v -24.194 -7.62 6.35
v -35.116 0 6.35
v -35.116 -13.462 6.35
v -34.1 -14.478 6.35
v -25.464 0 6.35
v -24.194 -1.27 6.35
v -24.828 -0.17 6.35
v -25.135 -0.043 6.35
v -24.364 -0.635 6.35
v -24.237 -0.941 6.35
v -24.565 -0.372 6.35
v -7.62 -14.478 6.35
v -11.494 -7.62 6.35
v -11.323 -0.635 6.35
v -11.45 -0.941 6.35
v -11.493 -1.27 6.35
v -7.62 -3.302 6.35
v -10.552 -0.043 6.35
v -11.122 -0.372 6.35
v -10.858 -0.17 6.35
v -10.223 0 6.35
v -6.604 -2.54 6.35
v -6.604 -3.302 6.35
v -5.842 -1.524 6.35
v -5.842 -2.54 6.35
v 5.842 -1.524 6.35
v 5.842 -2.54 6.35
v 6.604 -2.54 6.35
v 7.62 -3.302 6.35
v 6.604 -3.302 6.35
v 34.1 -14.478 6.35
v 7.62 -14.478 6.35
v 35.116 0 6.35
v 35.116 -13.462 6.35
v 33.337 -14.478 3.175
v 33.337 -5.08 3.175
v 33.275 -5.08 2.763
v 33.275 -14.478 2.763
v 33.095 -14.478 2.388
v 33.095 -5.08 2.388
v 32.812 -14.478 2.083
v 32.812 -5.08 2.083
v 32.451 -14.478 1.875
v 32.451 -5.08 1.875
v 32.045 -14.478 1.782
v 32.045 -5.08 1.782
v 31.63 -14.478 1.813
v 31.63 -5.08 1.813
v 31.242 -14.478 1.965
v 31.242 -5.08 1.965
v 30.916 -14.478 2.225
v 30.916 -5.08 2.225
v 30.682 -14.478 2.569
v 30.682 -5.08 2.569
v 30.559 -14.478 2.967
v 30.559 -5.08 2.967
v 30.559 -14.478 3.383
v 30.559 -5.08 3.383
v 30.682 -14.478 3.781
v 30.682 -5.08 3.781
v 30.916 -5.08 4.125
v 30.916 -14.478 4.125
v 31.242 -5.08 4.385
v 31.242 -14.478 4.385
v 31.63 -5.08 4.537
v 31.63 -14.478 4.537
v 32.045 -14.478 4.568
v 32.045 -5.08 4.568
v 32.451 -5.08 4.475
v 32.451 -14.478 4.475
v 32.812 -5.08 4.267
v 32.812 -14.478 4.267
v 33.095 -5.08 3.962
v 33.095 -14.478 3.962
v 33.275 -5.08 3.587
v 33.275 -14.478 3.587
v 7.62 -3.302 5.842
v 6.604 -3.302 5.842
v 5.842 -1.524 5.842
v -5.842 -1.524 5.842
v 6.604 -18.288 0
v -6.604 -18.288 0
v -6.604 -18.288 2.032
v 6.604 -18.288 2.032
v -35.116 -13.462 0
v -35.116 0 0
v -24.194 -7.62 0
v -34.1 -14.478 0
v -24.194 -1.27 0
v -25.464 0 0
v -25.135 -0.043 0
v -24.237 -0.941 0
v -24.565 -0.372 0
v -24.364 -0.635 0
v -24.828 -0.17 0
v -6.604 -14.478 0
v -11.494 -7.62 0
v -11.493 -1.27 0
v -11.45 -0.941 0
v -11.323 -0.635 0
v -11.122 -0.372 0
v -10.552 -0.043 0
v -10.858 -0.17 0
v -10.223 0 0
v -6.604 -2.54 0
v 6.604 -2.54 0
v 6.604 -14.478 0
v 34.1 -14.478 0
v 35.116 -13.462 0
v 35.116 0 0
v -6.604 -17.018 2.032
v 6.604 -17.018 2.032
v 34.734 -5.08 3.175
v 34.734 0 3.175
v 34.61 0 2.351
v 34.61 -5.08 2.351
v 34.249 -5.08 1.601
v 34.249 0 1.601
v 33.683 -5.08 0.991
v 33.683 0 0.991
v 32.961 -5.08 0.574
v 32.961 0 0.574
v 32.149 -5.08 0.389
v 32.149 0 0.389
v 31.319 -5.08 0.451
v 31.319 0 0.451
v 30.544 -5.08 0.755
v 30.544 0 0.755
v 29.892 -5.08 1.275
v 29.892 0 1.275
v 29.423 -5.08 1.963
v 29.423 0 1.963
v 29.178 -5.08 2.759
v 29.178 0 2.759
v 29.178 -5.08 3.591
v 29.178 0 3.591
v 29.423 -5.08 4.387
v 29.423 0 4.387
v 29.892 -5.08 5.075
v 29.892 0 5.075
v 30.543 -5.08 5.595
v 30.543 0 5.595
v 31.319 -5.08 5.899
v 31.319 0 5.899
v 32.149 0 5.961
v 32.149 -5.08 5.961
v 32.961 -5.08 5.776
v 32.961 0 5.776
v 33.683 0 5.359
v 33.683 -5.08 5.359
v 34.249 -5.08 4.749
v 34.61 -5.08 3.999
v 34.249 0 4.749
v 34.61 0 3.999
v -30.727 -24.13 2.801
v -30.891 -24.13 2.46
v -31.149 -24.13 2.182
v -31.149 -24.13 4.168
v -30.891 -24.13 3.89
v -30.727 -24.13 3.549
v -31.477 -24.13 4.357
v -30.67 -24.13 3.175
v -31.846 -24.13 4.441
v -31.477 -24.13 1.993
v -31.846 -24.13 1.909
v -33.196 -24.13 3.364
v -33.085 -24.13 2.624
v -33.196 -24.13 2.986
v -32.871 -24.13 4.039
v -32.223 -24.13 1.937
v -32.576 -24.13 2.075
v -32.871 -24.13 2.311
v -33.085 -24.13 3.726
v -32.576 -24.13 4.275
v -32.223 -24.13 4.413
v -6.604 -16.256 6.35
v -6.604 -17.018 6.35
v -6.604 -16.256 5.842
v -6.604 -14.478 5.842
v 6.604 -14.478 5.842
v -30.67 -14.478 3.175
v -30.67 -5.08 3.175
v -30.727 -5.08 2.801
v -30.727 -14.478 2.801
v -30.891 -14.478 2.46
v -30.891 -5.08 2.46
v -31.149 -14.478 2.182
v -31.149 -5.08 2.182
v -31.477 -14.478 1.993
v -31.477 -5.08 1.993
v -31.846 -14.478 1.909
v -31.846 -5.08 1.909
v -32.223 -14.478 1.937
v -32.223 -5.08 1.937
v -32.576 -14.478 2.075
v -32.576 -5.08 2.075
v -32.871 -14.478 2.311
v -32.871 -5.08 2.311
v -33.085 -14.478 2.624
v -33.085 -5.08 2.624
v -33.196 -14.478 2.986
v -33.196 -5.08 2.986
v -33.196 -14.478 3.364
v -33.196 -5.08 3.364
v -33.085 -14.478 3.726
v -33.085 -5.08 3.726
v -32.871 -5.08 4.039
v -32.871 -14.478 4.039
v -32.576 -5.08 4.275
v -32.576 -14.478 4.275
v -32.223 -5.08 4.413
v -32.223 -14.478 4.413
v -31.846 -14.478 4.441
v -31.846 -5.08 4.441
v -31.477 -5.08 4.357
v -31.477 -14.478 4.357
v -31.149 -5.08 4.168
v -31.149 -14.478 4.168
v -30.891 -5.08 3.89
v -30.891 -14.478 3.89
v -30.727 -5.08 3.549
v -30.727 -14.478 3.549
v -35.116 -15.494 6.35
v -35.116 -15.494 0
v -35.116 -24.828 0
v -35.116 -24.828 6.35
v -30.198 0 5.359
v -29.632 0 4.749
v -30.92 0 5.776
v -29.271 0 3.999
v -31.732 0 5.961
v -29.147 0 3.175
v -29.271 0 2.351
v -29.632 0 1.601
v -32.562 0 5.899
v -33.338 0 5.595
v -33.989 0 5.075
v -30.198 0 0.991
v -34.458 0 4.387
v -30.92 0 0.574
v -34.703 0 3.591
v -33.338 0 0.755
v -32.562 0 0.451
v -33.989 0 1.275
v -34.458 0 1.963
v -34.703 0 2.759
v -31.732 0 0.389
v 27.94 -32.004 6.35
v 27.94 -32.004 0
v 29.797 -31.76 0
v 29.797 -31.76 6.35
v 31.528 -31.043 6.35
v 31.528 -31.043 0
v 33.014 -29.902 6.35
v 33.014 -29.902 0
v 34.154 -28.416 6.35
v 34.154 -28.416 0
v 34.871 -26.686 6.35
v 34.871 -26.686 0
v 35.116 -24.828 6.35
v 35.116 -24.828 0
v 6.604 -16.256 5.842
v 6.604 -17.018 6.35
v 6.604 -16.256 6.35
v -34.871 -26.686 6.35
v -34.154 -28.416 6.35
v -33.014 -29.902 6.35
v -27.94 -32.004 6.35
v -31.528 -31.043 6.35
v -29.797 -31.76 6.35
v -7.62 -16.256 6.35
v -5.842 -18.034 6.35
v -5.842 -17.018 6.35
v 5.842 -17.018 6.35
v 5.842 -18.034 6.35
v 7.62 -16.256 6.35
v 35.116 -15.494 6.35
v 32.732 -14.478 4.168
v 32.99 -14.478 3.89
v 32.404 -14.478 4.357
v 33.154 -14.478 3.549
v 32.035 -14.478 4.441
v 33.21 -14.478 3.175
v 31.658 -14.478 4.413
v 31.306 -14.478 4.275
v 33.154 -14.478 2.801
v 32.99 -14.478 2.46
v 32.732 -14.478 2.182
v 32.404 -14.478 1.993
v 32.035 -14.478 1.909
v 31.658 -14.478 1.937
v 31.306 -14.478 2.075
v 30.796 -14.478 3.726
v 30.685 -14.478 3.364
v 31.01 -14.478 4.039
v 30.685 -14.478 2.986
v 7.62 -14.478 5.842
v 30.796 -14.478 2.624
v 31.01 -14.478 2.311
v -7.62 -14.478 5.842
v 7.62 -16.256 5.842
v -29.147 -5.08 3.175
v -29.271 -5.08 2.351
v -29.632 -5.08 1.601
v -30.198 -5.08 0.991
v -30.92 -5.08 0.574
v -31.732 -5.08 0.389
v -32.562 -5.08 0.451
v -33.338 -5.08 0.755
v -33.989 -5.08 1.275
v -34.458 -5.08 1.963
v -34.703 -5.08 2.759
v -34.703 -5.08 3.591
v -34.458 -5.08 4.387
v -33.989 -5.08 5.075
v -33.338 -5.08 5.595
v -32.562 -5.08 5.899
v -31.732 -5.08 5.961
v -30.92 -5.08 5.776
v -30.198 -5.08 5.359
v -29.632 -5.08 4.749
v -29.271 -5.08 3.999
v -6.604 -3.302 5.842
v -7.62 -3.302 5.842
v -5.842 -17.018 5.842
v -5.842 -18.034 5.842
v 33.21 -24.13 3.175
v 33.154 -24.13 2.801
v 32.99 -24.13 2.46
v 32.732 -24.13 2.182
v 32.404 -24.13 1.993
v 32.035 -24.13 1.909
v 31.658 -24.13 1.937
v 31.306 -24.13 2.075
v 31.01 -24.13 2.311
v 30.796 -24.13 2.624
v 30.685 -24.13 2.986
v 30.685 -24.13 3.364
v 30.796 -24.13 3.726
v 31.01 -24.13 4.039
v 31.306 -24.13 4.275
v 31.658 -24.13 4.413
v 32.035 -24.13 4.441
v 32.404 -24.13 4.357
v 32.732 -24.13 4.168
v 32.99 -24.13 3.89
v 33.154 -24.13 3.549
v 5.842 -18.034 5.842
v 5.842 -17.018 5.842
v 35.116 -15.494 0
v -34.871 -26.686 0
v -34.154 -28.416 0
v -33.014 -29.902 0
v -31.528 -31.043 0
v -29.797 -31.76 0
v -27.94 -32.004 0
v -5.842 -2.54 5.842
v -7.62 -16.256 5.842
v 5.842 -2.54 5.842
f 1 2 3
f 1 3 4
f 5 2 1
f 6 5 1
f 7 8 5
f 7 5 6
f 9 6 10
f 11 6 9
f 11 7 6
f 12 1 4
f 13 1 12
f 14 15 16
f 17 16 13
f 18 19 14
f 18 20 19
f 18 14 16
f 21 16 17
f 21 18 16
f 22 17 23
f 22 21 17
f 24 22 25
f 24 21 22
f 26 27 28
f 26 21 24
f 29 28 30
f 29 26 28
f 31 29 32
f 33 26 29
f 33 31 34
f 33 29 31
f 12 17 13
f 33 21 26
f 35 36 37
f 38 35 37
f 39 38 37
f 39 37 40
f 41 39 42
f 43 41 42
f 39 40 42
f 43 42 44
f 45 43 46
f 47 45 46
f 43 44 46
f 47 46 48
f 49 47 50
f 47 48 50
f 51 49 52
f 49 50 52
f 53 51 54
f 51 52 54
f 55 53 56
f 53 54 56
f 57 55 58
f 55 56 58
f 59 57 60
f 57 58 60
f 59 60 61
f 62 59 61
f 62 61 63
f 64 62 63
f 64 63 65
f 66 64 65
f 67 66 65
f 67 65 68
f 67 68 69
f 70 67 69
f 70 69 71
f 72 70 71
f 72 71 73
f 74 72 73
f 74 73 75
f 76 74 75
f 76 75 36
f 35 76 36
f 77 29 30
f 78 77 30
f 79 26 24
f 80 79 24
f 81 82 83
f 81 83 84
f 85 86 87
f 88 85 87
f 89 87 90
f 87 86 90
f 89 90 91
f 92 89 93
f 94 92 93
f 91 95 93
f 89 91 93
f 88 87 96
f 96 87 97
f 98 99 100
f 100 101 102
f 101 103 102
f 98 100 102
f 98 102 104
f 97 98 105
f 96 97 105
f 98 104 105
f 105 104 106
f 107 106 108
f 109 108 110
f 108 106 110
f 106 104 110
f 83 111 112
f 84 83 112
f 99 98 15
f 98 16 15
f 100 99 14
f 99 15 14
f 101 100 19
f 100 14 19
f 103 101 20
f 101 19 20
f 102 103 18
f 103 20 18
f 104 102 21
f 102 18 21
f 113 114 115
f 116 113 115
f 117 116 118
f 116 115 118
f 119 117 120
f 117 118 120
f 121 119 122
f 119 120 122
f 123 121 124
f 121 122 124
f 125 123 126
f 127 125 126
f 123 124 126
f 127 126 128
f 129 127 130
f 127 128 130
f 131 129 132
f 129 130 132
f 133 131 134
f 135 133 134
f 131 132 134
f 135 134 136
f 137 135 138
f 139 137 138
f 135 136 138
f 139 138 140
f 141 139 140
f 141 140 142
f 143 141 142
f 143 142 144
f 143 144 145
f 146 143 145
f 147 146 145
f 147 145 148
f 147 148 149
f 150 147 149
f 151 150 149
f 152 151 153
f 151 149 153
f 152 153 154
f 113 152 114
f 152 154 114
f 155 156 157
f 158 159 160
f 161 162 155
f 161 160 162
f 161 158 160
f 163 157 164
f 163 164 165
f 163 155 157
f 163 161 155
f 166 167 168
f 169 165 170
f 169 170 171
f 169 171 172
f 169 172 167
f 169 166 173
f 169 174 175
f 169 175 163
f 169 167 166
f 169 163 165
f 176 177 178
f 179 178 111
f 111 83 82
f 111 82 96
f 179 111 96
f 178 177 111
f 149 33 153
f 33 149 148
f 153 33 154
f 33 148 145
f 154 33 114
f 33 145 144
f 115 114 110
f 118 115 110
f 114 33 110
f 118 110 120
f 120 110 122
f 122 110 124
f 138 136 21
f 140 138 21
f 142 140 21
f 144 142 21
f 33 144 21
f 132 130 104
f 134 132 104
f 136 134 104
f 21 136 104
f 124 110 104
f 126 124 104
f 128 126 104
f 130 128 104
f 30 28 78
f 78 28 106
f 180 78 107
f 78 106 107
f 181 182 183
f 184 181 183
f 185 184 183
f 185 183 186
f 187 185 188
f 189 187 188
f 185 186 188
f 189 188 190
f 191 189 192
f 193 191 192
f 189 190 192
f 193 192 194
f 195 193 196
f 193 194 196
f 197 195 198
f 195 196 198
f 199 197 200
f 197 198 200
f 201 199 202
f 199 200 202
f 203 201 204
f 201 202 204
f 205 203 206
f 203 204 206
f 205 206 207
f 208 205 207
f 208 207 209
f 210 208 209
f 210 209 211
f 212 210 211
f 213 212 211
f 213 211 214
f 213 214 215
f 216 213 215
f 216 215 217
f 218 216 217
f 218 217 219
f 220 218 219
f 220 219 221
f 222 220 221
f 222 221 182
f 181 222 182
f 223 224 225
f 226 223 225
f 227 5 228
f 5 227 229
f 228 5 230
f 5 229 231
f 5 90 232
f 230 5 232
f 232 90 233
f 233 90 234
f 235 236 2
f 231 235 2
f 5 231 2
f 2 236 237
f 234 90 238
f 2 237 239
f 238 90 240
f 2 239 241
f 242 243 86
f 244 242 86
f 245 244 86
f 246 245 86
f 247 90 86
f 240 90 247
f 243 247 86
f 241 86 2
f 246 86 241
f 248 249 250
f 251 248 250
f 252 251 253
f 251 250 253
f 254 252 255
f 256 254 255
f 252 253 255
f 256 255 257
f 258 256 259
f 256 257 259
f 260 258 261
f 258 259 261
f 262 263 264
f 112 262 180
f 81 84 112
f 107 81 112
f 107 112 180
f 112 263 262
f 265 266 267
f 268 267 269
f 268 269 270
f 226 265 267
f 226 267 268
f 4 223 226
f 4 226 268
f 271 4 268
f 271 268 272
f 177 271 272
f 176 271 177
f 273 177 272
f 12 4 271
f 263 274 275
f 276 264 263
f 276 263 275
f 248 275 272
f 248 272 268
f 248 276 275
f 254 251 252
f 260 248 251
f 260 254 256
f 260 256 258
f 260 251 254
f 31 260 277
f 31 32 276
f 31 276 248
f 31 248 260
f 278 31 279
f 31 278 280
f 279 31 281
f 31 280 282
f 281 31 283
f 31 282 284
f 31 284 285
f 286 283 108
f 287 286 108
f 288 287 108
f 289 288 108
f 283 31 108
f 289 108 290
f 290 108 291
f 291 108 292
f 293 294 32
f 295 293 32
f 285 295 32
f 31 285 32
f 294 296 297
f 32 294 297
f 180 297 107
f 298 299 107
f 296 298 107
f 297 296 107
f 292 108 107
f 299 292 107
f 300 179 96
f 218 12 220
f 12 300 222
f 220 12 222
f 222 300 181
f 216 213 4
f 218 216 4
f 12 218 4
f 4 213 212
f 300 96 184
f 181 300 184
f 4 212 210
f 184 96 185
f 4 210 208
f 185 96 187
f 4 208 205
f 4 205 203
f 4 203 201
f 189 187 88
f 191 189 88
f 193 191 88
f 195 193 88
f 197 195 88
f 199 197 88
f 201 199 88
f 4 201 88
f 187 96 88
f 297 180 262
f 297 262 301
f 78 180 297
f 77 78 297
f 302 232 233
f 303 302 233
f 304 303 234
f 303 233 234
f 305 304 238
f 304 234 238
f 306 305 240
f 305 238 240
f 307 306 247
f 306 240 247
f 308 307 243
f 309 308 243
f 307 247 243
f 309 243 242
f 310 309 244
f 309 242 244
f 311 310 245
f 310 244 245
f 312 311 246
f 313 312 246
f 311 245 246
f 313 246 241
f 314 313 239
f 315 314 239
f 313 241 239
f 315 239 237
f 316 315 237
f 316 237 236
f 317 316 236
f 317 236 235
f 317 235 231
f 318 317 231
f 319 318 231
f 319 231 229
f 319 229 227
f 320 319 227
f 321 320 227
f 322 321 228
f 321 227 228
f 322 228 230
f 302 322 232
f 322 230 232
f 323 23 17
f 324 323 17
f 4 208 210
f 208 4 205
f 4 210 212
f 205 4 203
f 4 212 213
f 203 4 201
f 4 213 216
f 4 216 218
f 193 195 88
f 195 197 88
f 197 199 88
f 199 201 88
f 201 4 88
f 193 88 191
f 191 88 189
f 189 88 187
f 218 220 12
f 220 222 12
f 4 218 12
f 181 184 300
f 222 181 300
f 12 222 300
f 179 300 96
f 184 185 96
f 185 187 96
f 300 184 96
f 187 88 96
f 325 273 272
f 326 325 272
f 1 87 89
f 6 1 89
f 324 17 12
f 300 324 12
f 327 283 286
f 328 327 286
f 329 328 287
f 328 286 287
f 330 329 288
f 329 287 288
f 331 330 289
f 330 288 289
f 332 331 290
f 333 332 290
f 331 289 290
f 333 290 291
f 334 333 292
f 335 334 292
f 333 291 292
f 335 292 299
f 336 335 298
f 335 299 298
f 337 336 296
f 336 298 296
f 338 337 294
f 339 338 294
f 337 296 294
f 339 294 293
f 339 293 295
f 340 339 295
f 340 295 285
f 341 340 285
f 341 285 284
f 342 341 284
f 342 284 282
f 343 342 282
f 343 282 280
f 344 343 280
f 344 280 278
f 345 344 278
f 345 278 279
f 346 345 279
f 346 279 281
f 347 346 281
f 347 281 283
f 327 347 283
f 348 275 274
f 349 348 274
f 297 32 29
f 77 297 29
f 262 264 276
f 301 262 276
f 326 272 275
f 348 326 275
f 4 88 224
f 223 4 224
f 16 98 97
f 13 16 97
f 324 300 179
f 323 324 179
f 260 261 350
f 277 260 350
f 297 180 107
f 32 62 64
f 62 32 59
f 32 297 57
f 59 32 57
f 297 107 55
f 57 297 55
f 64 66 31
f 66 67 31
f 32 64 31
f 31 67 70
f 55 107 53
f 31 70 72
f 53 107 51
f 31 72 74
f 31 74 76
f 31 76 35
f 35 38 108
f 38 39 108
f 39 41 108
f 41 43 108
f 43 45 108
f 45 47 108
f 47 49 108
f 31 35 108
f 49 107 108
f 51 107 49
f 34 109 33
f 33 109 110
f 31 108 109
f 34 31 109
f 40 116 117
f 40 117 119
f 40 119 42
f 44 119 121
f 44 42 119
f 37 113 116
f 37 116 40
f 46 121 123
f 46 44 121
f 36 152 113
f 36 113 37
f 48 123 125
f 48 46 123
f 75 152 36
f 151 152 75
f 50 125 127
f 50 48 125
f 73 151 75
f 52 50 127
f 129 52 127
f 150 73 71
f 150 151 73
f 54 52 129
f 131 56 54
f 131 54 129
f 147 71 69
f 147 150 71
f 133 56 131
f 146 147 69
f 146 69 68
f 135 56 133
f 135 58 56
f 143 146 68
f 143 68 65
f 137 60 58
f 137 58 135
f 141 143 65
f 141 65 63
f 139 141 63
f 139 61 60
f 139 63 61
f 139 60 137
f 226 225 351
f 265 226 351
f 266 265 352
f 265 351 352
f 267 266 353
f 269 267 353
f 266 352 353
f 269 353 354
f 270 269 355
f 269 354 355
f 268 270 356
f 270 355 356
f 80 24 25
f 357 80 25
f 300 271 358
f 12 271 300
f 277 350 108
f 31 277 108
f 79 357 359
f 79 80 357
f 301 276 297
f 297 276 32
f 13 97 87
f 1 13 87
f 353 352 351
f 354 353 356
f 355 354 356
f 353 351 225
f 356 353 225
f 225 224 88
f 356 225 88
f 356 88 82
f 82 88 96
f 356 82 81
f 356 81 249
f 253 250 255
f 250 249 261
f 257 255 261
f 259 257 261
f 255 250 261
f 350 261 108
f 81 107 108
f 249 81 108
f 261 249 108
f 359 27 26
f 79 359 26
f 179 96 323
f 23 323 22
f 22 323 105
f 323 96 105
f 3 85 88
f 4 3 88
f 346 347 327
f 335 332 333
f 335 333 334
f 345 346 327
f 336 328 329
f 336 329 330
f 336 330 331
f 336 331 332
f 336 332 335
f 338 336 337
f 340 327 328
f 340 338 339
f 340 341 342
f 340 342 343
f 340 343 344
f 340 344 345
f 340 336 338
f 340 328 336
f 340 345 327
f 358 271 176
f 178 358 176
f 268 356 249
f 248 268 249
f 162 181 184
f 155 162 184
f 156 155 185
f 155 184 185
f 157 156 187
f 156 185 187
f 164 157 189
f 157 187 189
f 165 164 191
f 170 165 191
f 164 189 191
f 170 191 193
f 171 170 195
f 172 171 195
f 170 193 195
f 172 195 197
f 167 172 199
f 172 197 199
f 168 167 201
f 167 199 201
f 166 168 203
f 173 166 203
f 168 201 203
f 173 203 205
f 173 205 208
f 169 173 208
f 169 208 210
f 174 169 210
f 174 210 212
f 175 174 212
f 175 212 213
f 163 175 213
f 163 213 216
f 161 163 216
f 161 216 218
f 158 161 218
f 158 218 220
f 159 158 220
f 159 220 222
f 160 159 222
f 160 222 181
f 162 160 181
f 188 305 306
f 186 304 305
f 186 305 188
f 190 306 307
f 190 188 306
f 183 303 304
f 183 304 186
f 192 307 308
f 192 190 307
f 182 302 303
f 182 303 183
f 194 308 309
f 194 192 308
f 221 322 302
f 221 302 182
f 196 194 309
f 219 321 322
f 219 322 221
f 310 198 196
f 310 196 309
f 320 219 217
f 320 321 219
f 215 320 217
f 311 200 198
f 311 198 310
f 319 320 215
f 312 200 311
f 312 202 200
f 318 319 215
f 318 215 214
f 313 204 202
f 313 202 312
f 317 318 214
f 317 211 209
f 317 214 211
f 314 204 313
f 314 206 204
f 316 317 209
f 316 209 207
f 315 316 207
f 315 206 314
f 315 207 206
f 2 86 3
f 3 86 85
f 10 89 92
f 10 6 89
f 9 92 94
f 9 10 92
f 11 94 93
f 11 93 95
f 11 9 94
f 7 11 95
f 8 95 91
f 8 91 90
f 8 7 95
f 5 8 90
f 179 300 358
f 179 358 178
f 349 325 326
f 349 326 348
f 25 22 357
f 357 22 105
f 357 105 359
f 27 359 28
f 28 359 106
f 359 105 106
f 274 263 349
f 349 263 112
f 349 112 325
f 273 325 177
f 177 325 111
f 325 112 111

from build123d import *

# Parameters (mm, degrees)
F0_W      = 6.604
F0_H      = 2.54
F1_DEPTH  = 6.35
F0_H_2    = 1.27
F0_W_2    = 2.54
F2_DEPTH  = 6.35
F3_DEPTH  = 2.032
F6_DEPTH  = 5.08
F7_DEPTH  = 24.13
F8_DEPTH  = 14.478
F11_W     = 1.016
F11_H     = 1.778
F12_DEPTH = 0.508
F13_DEPTH = 0.508
F14_R     = 1.27


# Not quite as in the source:
# - a feature names something its author has since deleted; it is built from what else it names


with BuildPart() as f1:
    # F0 (on Top) → F1 (new body)
    with BuildSketch(Plane.XY):
        Polygon((-9.144, -14.478), (-9.144, 0), (-11.4935, 0), (-11.4935, -7.62), (-24.1935, -7.62), (-24.1935, 0), (-35.1155, 0), (-35.1155, -13.462), (-34.0995, -14.478), align=None)
        Polygon((35.1155, 0), (9.144, 0), (9.144, -14.478), (34.0995, -14.478), (35.1155, -13.462), align=None)
        Polygon((-6.604, -2.54), (-6.604, 0), (-9.144, 0), (-9.144, -14.478), (-6.604, -14.478), align=None)
        with Locations((-3.302, -1.27)):
            Rectangle(F0_W, F0_H)
        Polygon((9.144, 0), (0, 0), (0, -2.54), (6.604, -2.54), (6.604, -14.478), (9.144, -14.478), align=None)
    extrude(amount=F1_DEPTH)

    # F5 (on face) + F4 (on face) → F6 (cut)
    with BuildSketch(Plane(origin=(0, 0, 0), x_dir=(-1, 0, 0), z_dir=(0, 1, 0))):
        with BuildLine():
            ThreePointArc((-29.1465, 3.175), (-31.9405, 5.969), (-34.7345, 3.175))
            Line((-34.7345, 3.175), (-33.3375, 3.175))
            ThreePointArc((-33.3375, 3.175), (-31.9405, 4.572), (-30.5435, 3.175))
            Line((-30.5435, 3.175), (-29.1465, 3.175))
        make_face()
        with BuildLine():
            Line((-33.3375, 3.175), (-34.7345, 3.175))
            ThreePointArc((-34.7345, 3.175), (-31.9405, 0.381), (-29.1465, 3.175))
            Line((-29.1465, 3.175), (-30.5435, 3.175))
            ThreePointArc((-30.5435, 3.175), (-31.9405, 1.778), (-33.3375, 3.175))
        make_face()
        with BuildLine():
            Line((-33.2105, 3.175), (-33.3375, 3.175))
            ThreePointArc((-33.3375, 3.175), (-31.9405, 1.778), (-30.5435, 3.175))
            Line((-30.5435, 3.175), (-30.6705, 3.175))
            ThreePointArc((-30.6705, 3.175), (-31.9405, 1.905), (-33.2105, 3.175))
        make_face()
        with BuildLine():
            Line((-30.6705, 3.175), (-33.2105, 3.175))
            ThreePointArc((-33.2105, 3.175), (-31.9405, 1.905), (-30.6705, 3.175))
        make_face()
        with BuildLine():
            ThreePointArc((-30.5435, 3.175), (-31.9405, 4.572), (-33.3375, 3.175))
            Line((-33.3375, 3.175), (-33.2105, 3.175))
            ThreePointArc((-33.2105, 3.175), (-31.9405, 4.445), (-30.6705, 3.175))
            Line((-30.6705, 3.175), (-30.5435, 3.175))
        make_face()
        with BuildLine():
            ThreePointArc((-30.6705, 3.175), (-31.9405, 4.445), (-33.2105, 3.175))
            Line((-33.2105, 3.175), (-30.6705, 3.175))
        make_face()
    with BuildSketch(Plane(origin=(0, 0, 0), x_dir=(-1, 0, 0), z_dir=(0, 1, 0))):
        with BuildLine():
            Line((33.3375, 3.175), (34.7345, 3.175))
            ThreePointArc((34.7345, 3.175), (31.9405, 5.969), (29.1465, 3.175))
            Line((29.1465, 3.175), (30.5435, 3.175))
            ThreePointArc((30.5435, 3.175), (31.9405, 4.572), (33.3375, 3.175))
        make_face()
        with BuildLine():
            ThreePointArc((29.1465, 3.175), (31.9405, 0.381), (34.7345, 3.175))
            Line((34.7345, 3.175), (33.3375, 3.175))
            ThreePointArc((33.3375, 3.175), (31.9405, 1.778), (30.5435, 3.175))
            Line((30.5435, 3.175), (29.1465, 3.175))
        make_face()
        with BuildLine():
            ThreePointArc((30.5435, 3.175), (31.9405, 1.778), (33.3375, 3.175))
            Line((33.3375, 3.175), (33.2105, 3.175))
            ThreePointArc((33.2105, 3.175), (31.9405, 1.905), (30.6705, 3.175))
            Line((30.6705, 3.175), (30.5435, 3.175))
        make_face()
        with BuildLine():
            Line((33.2105, 3.175), (33.3375, 3.175))
            ThreePointArc((33.3375, 3.175), (31.9405, 4.572), (30.5435, 3.175))
            Line((30.5435, 3.175), (30.6705, 3.175))
            ThreePointArc((30.6705, 3.175), (31.9405, 4.445), (33.2105, 3.175))
        make_face()
        with BuildLine():
            Line((30.6705, 3.175), (33.2105, 3.175))
            ThreePointArc((33.2105, 3.175), (31.9405, 4.445), (30.6705, 3.175))
        make_face()
        with BuildLine():
            ThreePointArc((30.6705, 3.175), (31.9405, 1.905), (33.2105, 3.175))
            Line((33.2105, 3.175), (30.6705, 3.175))
        make_face()
    extrude(amount=-F6_DEPTH, mode=Mode.SUBTRACT)


with BuildPart() as f2:
    # F0 (on Top) → F2 (new body)
    with BuildSketch(Plane.XY):
        with BuildLine():
            ThreePointArc((-20.7645, -24.8285), (-27.94, -17.653), (-35.1155, -24.8285))
            ThreePointArc((-35.1155, -24.8285), (-33.0138447084, -29.9023447084), (-27.94, -32.004))
            ThreePointArc((-27.94, -32.004), (-22.8661552916, -29.9023447084), (-20.7645, -24.8285))
        make_face()
        with BuildLine():
            ThreePointArc((27.94, -32.004), (33.0138447084, -29.9023447084), (35.1155, -24.8285))
            ThreePointArc((35.1155, -24.8285), (22.8661552916, -19.7546552916), (27.94, -32.004))
        make_face()
        with Locations((-3.302, -17.653)):
            Rectangle(F0_W, F0_H_2)
        with BuildLine():
            Line((-9.144, -19.558), (-9.144, -14.478))
            Line((-9.144, -14.478), (-34.0995, -14.478))
            Line((-34.0995, -14.478), (-35.1155, -15.494))
            Line((-35.1155, -15.494), (-35.1155, -24.8285))
            ThreePointArc((-35.1155, -24.8285), (-27.94, -17.653), (-20.7645, -24.8285))
            ThreePointArc((-20.7645, -24.8285), (-22.8661552916, -29.9023447084), (-27.94, -32.004))
            Line((-27.94, -32.004), (0, -32.004))
            Line((0, -32.004), (0, -19.558))
            Line((0, -19.558), (-9.144, -19.558))
        make_face()
        Polygon((9.144, -19.558), (9.144, -17.018), (6.604, -17.018), (6.604, -18.288), (6.604, -19.558), align=None)
        with Locations((7.874, -15.748)):
            Rectangle(F0_W_2, F0_H)
        with Locations((3.302, -18.923)):
            Rectangle(F0_W, F0_H_2)
        with BuildLine():
            Line((34.0995, -14.478), (9.144, -14.478))
            Line((9.144, -14.478), (9.144, -17.018))
            Line((9.144, -17.018), (9.144, -19.558))
            Line((9.144, -19.558), (6.604, -19.558))
            Line((6.604, -19.558), (0, -19.558))
            Line((0, -19.558), (0, -32.004))
            Line((0, -32.004), (27.94, -32.004))
            ThreePointArc((27.94, -32.004), (22.8661552916, -19.7546552916), (35.1155, -24.8285))
            Line((35.1155, -24.8285), (35.1155, -15.494))
            Line((35.1155, -15.494), (34.0995, -14.478))
        make_face()
        Polygon((-6.604, -14.478), (-9.144, -14.478), (-9.144, -19.558), (0, -19.558), (0, -18.288), (-6.604, -18.288), (-6.604, -17.018), align=None)
        with Locations((3.302, -17.653)):
            Rectangle(F0_W, F0_H_2)
    extrude(amount=F2_DEPTH)

    # F0 (on Top) → F3 (cut)
    with BuildSketch(Plane.XY):
        with Locations((3.302, -17.653)):
            Rectangle(F0_W, F0_H_2)
        with Locations((-3.302, -17.653)):
            Rectangle(F0_W, F0_H_2)
    extrude(amount=F3_DEPTH, mode=Mode.SUBTRACT)


with BuildPart() as f7_tool:
    # F5 (on face) + F4 (on face) → F7 (new body)
    with BuildSketch(Plane(origin=(0, 0, 0), x_dir=(-1, 0, 0), z_dir=(0, 1, 0))):
        with BuildLine():
            ThreePointArc((-30.6705, 3.175), (-31.9405, 4.445), (-33.2105, 3.175))
            Line((-33.2105, 3.175), (-30.6705, 3.175))
        make_face()
        with BuildLine():
            Line((-30.6705, 3.175), (-33.2105, 3.175))
            ThreePointArc((-33.2105, 3.175), (-31.9405, 1.905), (-30.6705, 3.175))
        make_face()
    with BuildSketch(Plane(origin=(0, 0, 0), x_dir=(-1, 0, 0), z_dir=(0, 1, 0))):
        with BuildLine():
            Line((30.6705, 3.175), (33.2105, 3.175))
            ThreePointArc((33.2105, 3.175), (31.9405, 4.445), (30.6705, 3.175))
        make_face()
        with BuildLine():
            ThreePointArc((30.6705, 3.175), (31.9405, 1.905), (33.2105, 3.175))
            Line((33.2105, 3.175), (30.6705, 3.175))
        make_face()
    extrude(amount=-F7_DEPTH)


with BuildPart() as f1_1:
    add(f1.part)

    # F7: cut by f7_tool
    add(f7_tool.part, mode=Mode.SUBTRACT)

    # F5 (on face) + F4 (on face) → F8 (cut, through all)
    with BuildSketch(Plane(origin=(0, 0, 0), x_dir=(-1, 0, 0), z_dir=(0, 1, 0))):
        with BuildLine():
            ThreePointArc((-30.5435, 3.175), (-31.9405, 4.572), (-33.3375, 3.175))
            Line((-33.3375, 3.175), (-33.2105, 3.175))
            ThreePointArc((-33.2105, 3.175), (-31.9405, 4.445), (-30.6705, 3.175))
            Line((-30.6705, 3.175), (-30.5435, 3.175))
        make_face()
        with BuildLine():
            Line((-33.2105, 3.175), (-33.3375, 3.175))
            ThreePointArc((-33.3375, 3.175), (-31.9405, 1.778), (-30.5435, 3.175))
            Line((-30.5435, 3.175), (-30.6705, 3.175))
            ThreePointArc((-30.6705, 3.175), (-31.9405, 1.905), (-33.2105, 3.175))
        make_face()
    with BuildSketch(Plane(origin=(0, 0, 0), x_dir=(-1, 0, 0), z_dir=(0, 1, 0))):
        with BuildLine():
            Line((30.6705, 3.175), (33.2105, 3.175))
            ThreePointArc((33.2105, 3.175), (31.9405, 4.445), (30.6705, 3.175))
        make_face()
        with BuildLine():
            ThreePointArc((30.6705, 3.175), (31.9405, 1.905), (33.2105, 3.175))
            Line((33.2105, 3.175), (30.6705, 3.175))
        make_face()
    extrude(amount=-F8_DEPTH, mode=Mode.SUBTRACT)


with BuildPart() as f2_1:
    add(f2.part)

    # F7: cut by f7_tool
    add(f7_tool.part, mode=Mode.SUBTRACT)


with BuildPart() as f12_tool:
    # F9 (on face) + F10 (on face) + F11 (on face) → F12 (new body)
    with BuildSketch(Plane.XY.offset(6.35)):
        Polygon((-5.842, -2.54), (0, -2.54), (5.842, -2.54), (5.842, -1.524), (-5.842, -1.524), align=None)
    with BuildSketch(Plane.XY.offset(6.35)):
        Polygon((5.842, -18.034), (5.842, -17.018), (0, -17.018), (-5.842, -17.018), (-5.842, -18.034), align=None)
    with BuildSketch(Plane.XY.offset(6.35)):
        with Locations((-7.112, -15.367)):
            Rectangle(F11_W, F11_H)
        with Locations((7.112, -15.367)):
            Rectangle(F11_W, F11_H)
    extrude(amount=-F12_DEPTH)


with BuildPart() as f1_2:
    add(f1_1.part)

    # F12: cut by f12_tool
    add(f12_tool.part, mode=Mode.SUBTRACT)

    # F11 (on face) → F13 (cut)
    with BuildSketch(Plane.XY.offset(6.35)):
        Polygon((-6.604, -14.478), (-6.604, -9.779), (-6.604, -3.302), (-7.62, -3.302), (-7.62, -14.478), align=None)
        Polygon((6.604, -3.302), (6.604, -9.779), (6.604, -14.478), (7.62, -14.478), (7.62, -3.302), align=None)
    extrude(amount=-F13_DEPTH, mode=Mode.SUBTRACT)

    # F14
    f14_edges = [f1_2.edges().sort_by_distance(p)[0] for p in [
        (-11.4935, 0, 3.175),
        (-24.1935, 0, 3.175),
    ]]
    fillet(f14_edges, radius=F14_R)


with BuildPart() as f2_2:
    add(f2_1.part)

    # F12: cut by f12_tool
    add(f12_tool.part, mode=Mode.SUBTRACT)


solid = Compound([f1_2.part, f2_2.part])
